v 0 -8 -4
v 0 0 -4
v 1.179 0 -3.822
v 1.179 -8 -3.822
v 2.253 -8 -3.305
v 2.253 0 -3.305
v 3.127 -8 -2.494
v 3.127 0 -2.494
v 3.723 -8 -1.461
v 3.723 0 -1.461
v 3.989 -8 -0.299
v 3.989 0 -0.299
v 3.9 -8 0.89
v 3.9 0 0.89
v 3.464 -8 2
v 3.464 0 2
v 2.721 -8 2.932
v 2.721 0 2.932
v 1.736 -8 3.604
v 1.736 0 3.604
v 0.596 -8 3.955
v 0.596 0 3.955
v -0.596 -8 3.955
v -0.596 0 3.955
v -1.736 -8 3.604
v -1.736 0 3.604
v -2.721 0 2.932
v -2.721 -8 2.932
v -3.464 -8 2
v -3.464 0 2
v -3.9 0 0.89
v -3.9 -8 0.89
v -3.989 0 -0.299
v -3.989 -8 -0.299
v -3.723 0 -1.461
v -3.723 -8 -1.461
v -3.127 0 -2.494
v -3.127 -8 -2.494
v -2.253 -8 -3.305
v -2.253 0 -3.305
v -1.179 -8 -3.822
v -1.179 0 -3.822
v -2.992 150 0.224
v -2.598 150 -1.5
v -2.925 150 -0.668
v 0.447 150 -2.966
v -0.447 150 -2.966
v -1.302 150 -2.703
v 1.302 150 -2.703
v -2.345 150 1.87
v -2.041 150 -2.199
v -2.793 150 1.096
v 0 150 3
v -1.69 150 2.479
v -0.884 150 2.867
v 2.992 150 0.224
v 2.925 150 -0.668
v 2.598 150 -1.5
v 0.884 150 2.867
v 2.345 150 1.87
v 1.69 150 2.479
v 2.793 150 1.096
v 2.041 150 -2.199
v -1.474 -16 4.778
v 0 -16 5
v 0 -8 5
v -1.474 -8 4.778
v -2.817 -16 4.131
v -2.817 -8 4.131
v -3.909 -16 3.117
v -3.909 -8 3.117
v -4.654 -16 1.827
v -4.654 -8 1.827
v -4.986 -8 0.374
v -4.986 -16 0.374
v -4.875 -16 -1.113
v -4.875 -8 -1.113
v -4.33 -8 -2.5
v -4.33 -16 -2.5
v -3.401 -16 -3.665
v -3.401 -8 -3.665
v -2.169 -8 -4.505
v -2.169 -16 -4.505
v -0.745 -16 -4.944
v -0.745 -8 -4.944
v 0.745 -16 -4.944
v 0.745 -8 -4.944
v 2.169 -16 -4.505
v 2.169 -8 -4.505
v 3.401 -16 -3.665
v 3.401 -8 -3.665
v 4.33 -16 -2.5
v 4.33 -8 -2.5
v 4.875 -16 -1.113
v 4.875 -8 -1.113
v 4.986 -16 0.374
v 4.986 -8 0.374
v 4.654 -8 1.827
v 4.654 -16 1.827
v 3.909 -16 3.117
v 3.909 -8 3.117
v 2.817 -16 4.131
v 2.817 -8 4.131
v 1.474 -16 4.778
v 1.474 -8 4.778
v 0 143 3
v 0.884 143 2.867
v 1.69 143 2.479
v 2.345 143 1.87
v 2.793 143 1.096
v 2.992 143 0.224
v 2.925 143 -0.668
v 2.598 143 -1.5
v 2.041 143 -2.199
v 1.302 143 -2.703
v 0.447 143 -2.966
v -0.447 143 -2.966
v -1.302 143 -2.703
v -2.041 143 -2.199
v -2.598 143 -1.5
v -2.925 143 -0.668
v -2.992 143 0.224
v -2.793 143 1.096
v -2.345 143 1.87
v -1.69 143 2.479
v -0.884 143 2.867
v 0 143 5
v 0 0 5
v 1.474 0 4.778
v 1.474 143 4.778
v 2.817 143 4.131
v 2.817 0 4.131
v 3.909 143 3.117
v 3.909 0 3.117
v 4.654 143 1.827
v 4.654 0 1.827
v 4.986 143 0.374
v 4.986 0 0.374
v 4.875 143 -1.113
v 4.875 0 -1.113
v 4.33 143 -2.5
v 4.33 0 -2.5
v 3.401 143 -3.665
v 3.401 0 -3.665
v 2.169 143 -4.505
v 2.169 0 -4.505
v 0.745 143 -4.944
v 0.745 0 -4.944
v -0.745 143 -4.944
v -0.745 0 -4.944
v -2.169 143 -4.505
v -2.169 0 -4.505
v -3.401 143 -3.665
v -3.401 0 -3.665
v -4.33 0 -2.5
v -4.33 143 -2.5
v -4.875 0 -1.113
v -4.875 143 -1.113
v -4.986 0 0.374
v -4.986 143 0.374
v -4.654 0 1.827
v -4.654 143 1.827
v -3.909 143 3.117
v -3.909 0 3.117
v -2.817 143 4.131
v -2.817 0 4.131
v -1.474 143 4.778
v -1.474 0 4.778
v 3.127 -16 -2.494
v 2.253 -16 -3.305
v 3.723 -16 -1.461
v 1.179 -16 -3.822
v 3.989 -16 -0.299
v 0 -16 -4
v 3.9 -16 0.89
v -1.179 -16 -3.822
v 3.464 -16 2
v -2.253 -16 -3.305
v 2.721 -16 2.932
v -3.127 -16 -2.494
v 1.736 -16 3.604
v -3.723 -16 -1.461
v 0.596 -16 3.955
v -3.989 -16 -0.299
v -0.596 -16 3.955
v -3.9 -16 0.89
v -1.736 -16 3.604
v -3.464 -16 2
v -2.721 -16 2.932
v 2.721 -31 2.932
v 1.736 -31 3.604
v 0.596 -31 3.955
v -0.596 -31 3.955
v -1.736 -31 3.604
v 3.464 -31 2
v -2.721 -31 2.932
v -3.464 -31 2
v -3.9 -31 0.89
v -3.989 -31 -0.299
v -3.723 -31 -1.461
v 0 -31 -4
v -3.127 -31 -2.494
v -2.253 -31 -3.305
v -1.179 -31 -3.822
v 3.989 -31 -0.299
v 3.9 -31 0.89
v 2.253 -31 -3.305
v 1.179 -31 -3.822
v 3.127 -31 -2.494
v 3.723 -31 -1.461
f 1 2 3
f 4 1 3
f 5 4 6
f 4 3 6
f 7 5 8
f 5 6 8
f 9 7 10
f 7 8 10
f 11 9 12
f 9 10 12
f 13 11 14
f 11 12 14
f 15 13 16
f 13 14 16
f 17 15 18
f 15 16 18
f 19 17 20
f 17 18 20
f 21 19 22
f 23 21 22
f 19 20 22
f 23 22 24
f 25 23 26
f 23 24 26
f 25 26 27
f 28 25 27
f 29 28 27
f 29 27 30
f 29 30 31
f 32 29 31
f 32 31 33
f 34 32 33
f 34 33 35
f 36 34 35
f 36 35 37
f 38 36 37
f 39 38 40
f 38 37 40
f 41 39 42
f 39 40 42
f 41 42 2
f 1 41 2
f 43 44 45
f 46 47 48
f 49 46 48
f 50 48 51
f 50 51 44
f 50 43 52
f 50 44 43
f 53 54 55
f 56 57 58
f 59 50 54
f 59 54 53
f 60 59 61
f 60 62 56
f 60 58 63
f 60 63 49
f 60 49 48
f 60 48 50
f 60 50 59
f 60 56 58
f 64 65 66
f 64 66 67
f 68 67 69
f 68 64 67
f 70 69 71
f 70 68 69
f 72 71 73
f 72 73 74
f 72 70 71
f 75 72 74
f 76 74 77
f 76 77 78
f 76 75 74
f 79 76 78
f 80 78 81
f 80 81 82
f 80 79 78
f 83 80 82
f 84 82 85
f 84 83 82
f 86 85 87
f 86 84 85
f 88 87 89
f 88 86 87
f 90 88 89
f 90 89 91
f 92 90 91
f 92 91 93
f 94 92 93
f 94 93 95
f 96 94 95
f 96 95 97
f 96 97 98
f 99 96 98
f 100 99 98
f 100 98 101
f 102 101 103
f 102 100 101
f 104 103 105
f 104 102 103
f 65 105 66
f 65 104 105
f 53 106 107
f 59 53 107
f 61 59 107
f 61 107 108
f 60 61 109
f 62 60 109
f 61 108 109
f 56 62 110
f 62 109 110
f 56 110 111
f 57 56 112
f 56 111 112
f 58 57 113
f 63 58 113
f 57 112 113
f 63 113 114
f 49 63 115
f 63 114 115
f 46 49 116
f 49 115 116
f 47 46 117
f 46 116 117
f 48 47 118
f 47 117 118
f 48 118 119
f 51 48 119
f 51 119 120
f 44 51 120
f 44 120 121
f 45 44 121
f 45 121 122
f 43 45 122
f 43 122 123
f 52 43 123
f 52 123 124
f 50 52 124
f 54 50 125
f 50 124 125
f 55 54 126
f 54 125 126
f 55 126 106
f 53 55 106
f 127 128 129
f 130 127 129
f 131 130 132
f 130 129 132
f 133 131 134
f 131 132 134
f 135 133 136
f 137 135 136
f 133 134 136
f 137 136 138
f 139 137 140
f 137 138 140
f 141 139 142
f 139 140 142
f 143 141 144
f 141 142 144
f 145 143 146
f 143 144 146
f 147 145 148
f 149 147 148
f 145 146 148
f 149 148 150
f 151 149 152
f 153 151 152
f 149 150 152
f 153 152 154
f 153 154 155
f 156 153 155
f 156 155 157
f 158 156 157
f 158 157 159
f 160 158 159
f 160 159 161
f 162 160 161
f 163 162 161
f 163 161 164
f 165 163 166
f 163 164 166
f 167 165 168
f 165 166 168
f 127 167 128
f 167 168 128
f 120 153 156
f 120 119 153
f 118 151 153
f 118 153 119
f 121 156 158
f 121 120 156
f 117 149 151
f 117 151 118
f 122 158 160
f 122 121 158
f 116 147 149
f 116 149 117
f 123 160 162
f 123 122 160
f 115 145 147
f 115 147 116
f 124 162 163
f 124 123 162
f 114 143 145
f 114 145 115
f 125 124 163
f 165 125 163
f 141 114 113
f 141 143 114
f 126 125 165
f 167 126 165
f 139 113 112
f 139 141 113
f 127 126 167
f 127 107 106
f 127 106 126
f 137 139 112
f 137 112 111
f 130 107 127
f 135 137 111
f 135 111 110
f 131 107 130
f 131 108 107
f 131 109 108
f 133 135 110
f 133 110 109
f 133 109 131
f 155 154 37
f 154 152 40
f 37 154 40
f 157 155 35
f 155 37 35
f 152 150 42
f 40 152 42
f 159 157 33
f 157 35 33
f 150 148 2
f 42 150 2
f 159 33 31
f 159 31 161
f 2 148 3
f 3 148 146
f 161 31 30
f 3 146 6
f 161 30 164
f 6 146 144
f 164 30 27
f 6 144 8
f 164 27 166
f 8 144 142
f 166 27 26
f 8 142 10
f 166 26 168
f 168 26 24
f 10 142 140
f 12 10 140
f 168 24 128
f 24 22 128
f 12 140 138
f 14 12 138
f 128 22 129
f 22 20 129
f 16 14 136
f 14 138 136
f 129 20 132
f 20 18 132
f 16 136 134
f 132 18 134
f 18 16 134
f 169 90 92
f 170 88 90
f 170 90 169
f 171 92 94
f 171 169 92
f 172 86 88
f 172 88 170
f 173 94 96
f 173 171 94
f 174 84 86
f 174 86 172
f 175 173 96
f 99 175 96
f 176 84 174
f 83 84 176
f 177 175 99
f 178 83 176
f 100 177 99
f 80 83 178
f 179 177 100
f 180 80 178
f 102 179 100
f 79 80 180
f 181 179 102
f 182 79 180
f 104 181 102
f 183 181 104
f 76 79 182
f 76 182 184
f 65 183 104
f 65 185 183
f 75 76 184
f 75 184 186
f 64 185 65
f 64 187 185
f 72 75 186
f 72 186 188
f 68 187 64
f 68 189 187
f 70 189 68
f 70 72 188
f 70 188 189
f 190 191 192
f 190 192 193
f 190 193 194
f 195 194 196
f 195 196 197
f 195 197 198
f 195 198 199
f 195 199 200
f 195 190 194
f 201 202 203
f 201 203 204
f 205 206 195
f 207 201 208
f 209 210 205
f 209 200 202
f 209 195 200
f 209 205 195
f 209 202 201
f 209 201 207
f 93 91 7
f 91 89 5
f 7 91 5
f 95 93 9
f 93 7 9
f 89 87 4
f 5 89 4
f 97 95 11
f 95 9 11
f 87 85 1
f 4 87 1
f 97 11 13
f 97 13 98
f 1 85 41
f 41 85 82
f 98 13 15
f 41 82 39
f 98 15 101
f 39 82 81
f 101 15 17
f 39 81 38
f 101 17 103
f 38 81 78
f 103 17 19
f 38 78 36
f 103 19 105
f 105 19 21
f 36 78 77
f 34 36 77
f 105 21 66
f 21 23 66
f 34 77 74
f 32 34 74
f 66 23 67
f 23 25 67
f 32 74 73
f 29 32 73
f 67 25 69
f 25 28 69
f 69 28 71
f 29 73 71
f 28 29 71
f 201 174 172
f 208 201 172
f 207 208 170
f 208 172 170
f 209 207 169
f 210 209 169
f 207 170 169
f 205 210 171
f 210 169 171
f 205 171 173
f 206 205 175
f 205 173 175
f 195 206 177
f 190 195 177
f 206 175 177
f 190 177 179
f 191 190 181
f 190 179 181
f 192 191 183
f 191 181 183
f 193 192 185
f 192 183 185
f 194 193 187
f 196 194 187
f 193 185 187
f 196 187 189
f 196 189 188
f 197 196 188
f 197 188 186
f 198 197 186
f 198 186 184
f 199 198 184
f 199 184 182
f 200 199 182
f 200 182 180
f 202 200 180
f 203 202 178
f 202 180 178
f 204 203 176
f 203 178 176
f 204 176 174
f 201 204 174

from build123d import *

# Parameters (mm, degrees)
SKETCH1_R           = 5
BOSS_EXTRUDE1_DEPTH = 143
SKETCH2_R           = 4
BOSS_EXTRUDE2_DEPTH = 8
BOSS_EXTRUDE3_START = 8
SKETCH3_R           = 5
BOSS_EXTRUDE3_DEPTH = 8
SKETCH4_R           = 4
BOSS_EXTRUDE4_DEPTH = 15
SKETCH5_R           = 3
BOSS_EXTRUDE5_DEPTH = 7


with BuildPart() as part:
    # Sketch1 → Boss-Extrude1 (new body)
    with BuildSketch(Plane(origin=(0, 0, 0), x_dir=(1, 0, 0), z_dir=(0, 1, 0))):
        with Locations(Location((0, 0, 0), (0, 0, 270))):
            Circle(SKETCH1_R)
    extrude(amount=BOSS_EXTRUDE1_DEPTH)

    # Sketch2 → Boss-Extrude2 (add)
    with BuildSketch(Plane.XZ):
        with Locations(Location((0, 0, 0), (0, 0, 270))):
            Circle(SKETCH2_R)
    extrude(amount=BOSS_EXTRUDE2_DEPTH)

    # Sketch3 → Boss-Extrude3 (add)
    with BuildSketch(Plane.XZ.offset(8).offset(BOSS_EXTRUDE3_START)):
        with Locations(Location((0, 0, 0), (0, 0, 90))):
            Circle(SKETCH3_R)
    extrude(amount=-BOSS_EXTRUDE3_DEPTH)

    # Sketch4 → Boss-Extrude4 (add)
    with BuildSketch(Plane.XZ.offset(16)):
        with Locations(Location((0, 0, 0), (0, 0, 270))):
            Circle(SKETCH4_R)
    extrude(amount=BOSS_EXTRUDE4_DEPTH)

    # Sketch5 → Boss-Extrude5 (add)
    with BuildSketch(Plane(origin=(0, 143, 0), x_dir=(1, 0, 0), z_dir=(0, 1, 0))):
        with Locations(Location((0, 0, 0), (0, 0, 270))):
            Circle(SKETCH5_R)
    extrude(amount=BOSS_EXTRUDE5_DEPTH)


solid = part.part
